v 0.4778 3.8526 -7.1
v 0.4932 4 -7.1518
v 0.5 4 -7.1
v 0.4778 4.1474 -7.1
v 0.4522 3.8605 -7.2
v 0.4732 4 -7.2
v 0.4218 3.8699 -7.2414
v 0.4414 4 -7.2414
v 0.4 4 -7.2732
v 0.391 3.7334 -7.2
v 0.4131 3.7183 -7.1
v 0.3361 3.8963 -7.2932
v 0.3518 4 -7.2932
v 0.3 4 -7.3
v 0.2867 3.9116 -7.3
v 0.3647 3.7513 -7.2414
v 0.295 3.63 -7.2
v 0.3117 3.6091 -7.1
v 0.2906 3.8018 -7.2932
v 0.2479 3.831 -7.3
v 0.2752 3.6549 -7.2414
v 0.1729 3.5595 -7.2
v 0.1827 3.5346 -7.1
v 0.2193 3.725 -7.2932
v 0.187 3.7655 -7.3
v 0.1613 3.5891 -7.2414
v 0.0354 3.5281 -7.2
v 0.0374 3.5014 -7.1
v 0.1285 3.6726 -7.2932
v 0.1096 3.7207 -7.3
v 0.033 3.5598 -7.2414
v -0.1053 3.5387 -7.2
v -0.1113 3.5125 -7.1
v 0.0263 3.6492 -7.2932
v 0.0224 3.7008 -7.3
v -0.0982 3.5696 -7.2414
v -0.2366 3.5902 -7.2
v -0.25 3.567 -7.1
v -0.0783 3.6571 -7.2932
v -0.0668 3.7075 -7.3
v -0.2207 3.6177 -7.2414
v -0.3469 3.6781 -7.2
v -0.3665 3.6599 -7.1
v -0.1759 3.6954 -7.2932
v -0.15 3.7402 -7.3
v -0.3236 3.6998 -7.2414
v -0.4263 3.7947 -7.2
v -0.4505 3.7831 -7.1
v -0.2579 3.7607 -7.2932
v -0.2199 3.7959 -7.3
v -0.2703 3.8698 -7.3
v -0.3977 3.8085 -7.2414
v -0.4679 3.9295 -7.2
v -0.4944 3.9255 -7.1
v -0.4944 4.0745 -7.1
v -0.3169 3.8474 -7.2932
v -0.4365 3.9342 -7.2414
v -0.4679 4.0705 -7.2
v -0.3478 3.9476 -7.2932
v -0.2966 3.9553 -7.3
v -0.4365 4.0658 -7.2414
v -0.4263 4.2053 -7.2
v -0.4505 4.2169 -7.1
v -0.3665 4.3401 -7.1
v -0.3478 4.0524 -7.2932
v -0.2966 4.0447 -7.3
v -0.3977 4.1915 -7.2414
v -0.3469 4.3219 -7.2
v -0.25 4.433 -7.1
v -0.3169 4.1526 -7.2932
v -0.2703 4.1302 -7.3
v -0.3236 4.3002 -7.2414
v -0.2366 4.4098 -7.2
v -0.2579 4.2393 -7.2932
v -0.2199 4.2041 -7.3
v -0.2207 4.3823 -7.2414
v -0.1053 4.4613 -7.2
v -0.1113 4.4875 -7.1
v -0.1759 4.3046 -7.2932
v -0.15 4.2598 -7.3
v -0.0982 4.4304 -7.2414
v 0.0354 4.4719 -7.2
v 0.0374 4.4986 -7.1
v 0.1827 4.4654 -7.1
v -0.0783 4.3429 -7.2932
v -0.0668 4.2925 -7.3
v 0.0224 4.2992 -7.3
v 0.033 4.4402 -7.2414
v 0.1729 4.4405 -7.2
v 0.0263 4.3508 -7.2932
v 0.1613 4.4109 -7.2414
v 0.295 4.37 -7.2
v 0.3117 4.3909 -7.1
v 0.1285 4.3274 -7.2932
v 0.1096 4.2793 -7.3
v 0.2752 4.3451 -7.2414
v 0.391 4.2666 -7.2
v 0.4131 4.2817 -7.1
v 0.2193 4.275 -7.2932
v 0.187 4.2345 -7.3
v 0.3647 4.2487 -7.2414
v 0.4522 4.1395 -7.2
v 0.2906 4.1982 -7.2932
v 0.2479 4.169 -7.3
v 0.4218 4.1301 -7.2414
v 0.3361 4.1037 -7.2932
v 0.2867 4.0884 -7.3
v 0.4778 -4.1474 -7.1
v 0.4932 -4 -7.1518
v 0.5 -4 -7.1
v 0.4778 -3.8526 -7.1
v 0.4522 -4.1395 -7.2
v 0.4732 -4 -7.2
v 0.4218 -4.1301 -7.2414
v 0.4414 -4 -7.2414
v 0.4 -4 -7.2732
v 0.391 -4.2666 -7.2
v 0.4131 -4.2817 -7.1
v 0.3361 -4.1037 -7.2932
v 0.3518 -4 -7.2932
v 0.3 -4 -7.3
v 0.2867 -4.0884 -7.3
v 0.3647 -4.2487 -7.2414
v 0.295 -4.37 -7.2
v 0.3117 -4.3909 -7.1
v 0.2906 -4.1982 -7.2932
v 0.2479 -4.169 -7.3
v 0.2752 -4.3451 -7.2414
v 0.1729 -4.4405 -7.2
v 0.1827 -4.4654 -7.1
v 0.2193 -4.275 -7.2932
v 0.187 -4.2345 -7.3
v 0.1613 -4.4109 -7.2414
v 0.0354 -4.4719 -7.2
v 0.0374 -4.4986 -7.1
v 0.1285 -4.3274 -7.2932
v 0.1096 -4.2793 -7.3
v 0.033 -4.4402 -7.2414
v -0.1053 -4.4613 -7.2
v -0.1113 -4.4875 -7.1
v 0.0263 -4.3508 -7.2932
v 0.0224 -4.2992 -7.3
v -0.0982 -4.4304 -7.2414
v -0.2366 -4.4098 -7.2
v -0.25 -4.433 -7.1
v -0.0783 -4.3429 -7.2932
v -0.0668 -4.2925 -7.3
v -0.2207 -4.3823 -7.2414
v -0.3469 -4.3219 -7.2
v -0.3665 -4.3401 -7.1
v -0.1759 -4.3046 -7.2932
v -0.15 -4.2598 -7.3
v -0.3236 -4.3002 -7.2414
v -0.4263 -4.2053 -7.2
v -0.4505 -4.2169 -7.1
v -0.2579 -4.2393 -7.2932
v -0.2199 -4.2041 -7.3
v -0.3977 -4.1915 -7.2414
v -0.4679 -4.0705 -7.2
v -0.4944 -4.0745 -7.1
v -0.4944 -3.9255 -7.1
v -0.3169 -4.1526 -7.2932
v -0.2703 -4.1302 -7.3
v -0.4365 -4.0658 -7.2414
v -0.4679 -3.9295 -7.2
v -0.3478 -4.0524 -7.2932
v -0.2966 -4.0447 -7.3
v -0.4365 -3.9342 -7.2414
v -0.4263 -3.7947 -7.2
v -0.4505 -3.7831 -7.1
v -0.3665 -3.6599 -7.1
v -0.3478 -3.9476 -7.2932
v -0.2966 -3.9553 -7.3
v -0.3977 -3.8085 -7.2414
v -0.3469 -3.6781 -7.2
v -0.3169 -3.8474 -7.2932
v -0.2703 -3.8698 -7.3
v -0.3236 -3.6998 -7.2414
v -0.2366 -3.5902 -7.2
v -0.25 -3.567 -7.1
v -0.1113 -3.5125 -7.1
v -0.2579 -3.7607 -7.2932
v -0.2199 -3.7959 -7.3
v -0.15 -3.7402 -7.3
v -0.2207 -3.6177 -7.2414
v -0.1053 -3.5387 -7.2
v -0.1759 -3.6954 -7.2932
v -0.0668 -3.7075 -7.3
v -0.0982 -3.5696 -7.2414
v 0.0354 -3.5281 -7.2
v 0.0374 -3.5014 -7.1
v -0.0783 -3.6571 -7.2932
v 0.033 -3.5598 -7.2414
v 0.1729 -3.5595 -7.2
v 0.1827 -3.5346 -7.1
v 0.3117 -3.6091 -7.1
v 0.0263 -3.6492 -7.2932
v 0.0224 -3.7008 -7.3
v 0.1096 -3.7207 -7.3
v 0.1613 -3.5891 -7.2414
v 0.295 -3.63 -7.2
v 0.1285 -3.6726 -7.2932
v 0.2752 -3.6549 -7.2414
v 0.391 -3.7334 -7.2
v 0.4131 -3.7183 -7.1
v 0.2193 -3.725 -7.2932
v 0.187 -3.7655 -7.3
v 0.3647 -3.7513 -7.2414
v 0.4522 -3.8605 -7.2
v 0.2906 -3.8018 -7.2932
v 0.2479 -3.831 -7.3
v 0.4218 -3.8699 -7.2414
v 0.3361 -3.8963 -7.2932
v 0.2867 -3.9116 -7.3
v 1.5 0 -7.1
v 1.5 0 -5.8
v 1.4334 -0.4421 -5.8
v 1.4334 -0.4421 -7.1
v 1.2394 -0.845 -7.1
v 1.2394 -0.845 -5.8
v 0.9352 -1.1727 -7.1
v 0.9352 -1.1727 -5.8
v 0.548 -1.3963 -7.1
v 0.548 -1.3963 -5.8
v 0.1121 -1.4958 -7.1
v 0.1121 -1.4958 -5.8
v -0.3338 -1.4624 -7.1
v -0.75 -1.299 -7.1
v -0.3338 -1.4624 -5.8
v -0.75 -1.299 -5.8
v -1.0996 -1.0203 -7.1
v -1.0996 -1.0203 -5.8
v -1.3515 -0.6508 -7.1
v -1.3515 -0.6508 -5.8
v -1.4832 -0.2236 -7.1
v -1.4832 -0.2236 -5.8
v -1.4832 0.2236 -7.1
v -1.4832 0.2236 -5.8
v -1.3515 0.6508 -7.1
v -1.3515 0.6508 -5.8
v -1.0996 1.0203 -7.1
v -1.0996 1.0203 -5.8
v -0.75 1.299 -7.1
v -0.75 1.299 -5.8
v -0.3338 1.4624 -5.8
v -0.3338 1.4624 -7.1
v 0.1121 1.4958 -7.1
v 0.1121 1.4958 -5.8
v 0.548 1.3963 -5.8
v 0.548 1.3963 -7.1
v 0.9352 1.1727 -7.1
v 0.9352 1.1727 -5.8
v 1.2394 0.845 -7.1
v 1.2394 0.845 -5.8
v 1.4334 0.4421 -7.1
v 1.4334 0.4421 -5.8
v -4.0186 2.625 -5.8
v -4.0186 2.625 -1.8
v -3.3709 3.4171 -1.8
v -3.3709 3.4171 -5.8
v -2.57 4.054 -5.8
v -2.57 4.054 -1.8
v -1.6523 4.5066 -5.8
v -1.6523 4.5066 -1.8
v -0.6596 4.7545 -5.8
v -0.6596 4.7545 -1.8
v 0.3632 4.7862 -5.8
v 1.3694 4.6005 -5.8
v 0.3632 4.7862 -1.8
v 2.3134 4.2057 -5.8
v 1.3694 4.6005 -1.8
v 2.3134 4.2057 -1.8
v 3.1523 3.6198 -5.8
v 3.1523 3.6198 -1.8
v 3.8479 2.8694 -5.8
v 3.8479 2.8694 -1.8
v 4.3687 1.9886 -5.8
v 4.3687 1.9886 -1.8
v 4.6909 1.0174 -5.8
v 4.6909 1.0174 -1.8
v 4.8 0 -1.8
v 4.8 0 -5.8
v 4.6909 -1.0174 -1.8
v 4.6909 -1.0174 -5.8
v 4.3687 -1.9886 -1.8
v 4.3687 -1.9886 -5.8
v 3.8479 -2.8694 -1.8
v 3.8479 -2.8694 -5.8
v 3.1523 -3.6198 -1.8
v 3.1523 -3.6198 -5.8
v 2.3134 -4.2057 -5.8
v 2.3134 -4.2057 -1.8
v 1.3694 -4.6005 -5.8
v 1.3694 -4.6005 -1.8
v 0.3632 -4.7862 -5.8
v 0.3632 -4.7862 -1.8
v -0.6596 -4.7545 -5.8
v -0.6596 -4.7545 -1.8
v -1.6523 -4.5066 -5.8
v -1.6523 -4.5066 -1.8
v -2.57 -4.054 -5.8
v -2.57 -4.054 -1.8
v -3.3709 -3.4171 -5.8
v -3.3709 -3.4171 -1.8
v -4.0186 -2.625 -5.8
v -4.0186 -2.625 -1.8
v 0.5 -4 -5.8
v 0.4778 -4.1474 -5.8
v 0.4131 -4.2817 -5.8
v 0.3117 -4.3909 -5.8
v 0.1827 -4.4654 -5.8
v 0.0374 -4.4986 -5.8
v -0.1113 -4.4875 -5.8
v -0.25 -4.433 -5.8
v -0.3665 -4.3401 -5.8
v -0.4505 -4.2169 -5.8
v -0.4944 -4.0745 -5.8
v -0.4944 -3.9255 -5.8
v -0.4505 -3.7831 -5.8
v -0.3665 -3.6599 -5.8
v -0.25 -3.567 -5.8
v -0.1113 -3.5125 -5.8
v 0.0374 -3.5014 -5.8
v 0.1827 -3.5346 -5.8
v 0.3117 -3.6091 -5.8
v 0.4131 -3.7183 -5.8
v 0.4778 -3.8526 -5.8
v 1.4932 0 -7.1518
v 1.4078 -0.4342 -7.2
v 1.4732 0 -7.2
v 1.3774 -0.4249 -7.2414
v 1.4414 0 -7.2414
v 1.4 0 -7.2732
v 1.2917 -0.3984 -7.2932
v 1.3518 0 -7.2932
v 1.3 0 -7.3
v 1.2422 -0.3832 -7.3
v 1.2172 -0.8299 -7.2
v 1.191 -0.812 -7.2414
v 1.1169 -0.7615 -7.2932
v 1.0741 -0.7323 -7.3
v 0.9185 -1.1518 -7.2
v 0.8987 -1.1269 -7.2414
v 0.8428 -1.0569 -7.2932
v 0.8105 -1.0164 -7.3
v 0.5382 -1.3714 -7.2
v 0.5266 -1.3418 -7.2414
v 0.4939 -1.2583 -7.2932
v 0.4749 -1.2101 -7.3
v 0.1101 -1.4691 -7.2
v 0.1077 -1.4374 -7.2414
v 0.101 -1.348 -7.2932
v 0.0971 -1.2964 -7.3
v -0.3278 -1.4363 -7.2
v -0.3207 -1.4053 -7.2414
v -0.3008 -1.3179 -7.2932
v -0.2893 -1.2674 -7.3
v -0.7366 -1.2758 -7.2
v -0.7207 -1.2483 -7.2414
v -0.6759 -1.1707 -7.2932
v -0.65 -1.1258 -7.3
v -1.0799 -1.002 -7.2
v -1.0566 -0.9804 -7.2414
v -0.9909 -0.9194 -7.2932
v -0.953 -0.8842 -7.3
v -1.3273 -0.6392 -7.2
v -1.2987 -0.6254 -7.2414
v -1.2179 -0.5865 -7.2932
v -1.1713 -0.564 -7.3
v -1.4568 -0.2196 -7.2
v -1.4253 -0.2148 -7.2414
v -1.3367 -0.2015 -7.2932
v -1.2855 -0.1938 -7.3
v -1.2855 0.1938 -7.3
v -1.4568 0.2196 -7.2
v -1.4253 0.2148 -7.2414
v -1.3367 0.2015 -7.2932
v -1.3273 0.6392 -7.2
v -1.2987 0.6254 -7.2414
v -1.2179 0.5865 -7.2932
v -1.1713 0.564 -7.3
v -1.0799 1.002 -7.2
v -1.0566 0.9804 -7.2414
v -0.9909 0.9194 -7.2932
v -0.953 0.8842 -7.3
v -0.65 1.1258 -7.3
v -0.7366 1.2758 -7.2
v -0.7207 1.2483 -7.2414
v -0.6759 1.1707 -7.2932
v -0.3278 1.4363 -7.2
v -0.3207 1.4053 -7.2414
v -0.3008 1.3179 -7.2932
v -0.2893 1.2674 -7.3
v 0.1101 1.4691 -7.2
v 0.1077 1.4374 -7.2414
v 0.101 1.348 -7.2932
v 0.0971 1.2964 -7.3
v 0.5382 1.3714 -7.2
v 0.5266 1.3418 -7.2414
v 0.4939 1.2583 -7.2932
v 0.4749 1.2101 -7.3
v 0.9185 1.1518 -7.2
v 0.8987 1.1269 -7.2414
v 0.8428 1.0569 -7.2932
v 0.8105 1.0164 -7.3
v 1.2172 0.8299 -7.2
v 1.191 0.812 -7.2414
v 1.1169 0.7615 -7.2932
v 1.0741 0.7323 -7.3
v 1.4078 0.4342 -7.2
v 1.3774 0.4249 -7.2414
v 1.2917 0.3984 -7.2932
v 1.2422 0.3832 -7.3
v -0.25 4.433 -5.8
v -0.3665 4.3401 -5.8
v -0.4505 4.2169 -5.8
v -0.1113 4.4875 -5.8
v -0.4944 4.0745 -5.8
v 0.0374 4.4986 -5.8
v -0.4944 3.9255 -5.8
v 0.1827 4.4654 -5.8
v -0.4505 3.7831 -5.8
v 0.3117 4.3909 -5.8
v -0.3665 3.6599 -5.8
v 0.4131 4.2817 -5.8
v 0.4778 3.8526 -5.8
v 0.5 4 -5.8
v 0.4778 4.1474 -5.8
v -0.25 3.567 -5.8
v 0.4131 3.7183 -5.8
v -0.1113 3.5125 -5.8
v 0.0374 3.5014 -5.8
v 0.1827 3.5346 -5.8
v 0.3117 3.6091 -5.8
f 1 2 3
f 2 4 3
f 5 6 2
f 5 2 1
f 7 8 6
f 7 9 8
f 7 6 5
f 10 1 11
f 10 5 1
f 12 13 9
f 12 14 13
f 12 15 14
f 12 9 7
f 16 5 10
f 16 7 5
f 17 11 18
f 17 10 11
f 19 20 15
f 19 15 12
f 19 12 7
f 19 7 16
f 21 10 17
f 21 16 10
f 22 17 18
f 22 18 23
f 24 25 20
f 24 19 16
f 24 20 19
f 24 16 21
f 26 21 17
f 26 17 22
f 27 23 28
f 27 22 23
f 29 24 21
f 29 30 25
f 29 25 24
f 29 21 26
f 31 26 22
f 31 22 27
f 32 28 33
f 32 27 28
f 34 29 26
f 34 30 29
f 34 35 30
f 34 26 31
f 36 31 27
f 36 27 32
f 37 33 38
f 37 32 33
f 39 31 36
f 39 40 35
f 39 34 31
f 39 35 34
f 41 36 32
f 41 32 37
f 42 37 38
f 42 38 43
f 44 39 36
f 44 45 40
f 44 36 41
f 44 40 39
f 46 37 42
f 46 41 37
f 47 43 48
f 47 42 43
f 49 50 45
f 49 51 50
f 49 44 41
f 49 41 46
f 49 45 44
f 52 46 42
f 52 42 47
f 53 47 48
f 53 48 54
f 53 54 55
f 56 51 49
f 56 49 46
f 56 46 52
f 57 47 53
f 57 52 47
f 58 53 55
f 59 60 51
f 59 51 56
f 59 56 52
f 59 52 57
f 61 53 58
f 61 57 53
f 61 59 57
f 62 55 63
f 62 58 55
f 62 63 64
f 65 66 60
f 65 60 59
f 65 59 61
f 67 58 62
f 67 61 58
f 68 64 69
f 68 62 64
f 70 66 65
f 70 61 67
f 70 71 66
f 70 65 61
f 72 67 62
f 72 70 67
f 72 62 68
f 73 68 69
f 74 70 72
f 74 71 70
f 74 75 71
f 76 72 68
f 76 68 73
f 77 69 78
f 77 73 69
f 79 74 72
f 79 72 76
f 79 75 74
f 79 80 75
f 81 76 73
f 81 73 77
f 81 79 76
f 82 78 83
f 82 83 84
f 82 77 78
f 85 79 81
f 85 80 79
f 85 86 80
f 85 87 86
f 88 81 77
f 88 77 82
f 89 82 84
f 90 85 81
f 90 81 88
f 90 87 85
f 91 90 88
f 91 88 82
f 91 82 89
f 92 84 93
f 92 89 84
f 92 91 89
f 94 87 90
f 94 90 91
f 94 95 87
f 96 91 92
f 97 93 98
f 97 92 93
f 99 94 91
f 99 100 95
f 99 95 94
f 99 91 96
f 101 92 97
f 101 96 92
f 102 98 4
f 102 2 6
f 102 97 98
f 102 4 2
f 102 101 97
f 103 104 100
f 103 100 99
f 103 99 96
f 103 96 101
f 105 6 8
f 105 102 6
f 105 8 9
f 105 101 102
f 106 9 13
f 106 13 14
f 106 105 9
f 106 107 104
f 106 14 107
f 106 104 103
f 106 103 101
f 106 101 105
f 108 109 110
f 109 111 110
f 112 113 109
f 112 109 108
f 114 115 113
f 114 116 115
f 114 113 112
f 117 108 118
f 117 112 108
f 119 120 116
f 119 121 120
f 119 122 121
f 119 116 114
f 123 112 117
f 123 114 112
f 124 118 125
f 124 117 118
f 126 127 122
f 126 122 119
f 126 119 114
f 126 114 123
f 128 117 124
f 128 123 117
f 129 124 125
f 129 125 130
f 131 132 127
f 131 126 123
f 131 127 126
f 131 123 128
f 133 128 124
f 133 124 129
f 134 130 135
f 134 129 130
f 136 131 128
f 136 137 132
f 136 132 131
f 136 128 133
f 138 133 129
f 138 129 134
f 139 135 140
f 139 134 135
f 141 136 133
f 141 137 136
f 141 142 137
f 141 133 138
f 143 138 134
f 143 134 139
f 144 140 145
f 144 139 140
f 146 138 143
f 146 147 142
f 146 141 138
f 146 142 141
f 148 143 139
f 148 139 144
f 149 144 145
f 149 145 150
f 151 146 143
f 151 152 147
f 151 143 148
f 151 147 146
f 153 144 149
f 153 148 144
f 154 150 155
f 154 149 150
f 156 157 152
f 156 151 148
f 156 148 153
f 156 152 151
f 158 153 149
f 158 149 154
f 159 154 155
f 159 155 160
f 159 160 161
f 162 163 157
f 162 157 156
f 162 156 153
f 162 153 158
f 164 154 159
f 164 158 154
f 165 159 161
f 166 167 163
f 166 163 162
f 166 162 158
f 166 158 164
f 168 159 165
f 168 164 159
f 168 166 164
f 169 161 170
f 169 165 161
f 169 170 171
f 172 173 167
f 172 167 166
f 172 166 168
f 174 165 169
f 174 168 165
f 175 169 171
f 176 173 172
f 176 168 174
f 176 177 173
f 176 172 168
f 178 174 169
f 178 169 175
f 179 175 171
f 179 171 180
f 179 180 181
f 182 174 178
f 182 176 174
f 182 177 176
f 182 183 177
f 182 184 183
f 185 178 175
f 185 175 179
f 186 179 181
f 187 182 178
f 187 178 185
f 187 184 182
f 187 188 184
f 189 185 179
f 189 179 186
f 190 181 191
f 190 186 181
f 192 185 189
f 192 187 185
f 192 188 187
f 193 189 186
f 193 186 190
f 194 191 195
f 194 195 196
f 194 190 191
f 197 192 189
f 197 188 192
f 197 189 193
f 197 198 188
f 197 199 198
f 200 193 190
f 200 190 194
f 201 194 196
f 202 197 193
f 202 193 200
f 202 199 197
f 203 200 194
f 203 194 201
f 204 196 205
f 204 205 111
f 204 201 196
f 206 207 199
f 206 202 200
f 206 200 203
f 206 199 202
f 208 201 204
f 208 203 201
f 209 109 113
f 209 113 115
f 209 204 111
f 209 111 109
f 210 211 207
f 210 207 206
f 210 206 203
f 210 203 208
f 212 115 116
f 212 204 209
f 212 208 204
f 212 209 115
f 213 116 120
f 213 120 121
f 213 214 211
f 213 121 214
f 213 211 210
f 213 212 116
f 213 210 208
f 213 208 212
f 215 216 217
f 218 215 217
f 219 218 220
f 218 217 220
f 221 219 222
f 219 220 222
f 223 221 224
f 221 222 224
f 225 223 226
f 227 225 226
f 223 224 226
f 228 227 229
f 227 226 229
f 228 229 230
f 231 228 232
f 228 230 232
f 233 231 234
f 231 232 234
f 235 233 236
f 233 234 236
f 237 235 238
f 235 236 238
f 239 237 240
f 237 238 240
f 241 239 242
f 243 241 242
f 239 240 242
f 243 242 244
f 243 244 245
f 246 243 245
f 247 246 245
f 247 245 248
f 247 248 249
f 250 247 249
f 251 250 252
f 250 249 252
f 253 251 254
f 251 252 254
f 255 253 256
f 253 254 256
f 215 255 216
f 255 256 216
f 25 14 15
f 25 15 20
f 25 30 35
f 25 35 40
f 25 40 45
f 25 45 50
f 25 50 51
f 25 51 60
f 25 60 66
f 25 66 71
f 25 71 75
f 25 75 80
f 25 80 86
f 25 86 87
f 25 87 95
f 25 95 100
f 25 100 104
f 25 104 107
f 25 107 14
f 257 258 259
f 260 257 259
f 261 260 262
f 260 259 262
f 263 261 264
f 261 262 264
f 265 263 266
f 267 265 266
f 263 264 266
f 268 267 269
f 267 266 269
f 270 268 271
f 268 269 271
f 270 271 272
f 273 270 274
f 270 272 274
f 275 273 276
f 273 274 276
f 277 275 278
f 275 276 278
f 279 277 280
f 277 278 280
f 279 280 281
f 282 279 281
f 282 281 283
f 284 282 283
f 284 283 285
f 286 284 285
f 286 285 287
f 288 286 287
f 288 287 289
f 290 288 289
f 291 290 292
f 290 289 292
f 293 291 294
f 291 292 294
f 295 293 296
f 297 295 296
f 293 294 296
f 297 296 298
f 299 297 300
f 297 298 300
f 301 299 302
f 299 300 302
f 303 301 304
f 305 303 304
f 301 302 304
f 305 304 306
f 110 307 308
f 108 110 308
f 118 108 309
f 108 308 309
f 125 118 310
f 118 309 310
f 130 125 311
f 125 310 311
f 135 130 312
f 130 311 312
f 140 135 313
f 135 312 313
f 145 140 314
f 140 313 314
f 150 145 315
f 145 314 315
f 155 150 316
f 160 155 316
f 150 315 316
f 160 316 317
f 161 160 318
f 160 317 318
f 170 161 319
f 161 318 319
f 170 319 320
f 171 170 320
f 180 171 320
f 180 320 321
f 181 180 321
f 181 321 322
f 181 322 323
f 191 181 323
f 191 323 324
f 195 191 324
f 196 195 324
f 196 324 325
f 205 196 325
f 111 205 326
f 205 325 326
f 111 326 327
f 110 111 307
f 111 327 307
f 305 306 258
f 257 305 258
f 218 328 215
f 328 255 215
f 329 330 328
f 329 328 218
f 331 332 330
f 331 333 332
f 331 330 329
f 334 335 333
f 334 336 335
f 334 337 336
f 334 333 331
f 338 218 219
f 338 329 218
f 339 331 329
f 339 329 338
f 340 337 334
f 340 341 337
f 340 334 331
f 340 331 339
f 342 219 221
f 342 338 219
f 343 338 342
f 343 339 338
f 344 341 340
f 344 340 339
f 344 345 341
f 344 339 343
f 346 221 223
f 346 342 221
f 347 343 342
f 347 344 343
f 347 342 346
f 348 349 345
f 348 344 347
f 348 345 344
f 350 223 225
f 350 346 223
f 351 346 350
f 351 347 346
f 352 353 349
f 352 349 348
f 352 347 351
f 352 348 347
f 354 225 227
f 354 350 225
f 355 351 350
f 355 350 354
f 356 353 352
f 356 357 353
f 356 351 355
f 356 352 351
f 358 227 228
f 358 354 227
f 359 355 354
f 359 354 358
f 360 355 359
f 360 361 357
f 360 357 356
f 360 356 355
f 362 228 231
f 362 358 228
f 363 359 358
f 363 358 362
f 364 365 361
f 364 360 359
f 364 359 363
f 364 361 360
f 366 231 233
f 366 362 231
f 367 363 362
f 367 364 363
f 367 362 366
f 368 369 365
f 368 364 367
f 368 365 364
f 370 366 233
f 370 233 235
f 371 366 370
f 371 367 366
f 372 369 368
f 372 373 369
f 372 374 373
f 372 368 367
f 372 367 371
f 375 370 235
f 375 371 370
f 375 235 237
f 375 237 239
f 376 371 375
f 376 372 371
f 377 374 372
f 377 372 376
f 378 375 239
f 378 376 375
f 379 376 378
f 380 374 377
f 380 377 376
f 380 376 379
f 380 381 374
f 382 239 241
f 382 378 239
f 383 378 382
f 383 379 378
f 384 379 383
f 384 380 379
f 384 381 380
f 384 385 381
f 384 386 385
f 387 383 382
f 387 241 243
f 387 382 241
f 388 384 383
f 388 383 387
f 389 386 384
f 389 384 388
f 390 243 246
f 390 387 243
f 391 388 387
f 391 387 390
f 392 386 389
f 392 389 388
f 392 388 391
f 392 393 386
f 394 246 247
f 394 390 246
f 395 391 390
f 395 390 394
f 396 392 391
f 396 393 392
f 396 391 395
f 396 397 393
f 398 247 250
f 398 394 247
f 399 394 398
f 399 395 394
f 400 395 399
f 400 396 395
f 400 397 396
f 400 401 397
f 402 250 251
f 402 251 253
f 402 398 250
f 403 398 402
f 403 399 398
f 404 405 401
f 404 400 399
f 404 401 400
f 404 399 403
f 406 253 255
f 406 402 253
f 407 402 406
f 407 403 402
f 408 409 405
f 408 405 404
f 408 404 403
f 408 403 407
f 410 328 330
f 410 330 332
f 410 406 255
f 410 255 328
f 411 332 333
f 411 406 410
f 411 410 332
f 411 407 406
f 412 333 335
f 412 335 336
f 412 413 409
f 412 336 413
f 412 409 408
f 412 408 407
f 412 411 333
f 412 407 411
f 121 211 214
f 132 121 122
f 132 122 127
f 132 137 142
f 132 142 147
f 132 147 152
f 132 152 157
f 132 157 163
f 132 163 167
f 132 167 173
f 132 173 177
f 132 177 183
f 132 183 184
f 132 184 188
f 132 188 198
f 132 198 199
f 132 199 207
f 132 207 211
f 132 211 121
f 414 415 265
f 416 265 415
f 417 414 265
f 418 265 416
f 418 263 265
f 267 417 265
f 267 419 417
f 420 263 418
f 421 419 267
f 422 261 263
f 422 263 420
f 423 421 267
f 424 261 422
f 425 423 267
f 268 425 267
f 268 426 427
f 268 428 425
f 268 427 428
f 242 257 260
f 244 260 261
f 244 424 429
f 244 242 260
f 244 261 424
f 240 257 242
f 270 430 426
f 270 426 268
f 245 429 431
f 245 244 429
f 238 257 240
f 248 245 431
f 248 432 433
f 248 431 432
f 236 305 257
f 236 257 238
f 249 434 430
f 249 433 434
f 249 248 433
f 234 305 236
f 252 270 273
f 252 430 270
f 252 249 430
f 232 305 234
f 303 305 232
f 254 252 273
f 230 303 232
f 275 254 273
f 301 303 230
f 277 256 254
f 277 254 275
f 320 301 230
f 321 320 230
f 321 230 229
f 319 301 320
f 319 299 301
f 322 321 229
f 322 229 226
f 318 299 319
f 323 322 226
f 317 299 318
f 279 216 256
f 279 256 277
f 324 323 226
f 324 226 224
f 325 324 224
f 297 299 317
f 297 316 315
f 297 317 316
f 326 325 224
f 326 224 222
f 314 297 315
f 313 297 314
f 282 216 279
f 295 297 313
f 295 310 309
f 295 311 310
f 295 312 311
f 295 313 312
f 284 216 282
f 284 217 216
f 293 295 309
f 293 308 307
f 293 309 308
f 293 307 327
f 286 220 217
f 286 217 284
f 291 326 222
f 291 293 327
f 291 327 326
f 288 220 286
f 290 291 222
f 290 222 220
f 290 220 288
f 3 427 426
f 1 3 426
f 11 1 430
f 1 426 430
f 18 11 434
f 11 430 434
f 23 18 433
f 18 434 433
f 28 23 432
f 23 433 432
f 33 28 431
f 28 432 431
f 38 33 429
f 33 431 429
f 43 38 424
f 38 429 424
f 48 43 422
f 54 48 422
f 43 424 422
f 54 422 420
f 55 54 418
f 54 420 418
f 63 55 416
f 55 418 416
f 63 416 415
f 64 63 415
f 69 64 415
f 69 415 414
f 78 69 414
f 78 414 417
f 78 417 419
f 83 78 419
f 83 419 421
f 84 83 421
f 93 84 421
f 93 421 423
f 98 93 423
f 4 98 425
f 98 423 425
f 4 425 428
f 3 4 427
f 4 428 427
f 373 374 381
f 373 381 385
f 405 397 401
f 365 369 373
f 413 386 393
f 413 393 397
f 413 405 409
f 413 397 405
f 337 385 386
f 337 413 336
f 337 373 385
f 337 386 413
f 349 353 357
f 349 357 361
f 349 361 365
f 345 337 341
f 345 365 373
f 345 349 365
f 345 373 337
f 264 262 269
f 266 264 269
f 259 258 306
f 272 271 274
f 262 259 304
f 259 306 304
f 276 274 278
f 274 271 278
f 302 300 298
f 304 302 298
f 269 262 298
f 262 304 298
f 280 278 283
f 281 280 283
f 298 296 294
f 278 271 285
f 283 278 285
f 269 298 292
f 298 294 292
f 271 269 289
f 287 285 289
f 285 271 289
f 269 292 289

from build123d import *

# Parameters (mm, degrees)
PAD002_DEPTH  = 4
SKETCH006_R   = 1.5
SKETCH006_R_2 = 0.5
PAD003_DEPTH  = 1.5
FILLET_R      = 0.2


with BuildPart() as part:
    # Sketch005 (on Face1 of CopyPocket002) → Pad002 (new body)
    with BuildSketch(Plane(origin=(0, 0, -1.8), x_dir=(1, 0, 0), z_dir=(0, 0, -1))):
        with BuildLine():
            ThreePointArc((-4.018628, -2.625), (4.8, 0), (-4.018628, 2.625))
            Line((-4.018628, 2.625), (-4.018628, -2.625))
        make_face()
    extrude(amount=PAD002_DEPTH)

    # Sketch006 (on Face4 of Pad002) → Pad003 (join)
    with BuildSketch(Plane(origin=(0, 0, -5.8), x_dir=(1, 0, 0), z_dir=(0, 0, -1))):
        Circle(SKETCH006_R)
        with Locations((0, 4)):
            Circle(SKETCH006_R_2)
        with Locations((0, -4)):
            Circle(SKETCH006_R_2)
    extrude(amount=PAD003_DEPTH)

    # Fillet
    fillet_edges = [part.edges().sort_by_distance(p)[0] for p in [
        (-0.5, -4, -7.3),
        (-0.5, 4, -7.3),
        (-1.5, 0, -7.3),
    ]]
    fillet(fillet_edges, radius=FILLET_R)


solid = part.part
